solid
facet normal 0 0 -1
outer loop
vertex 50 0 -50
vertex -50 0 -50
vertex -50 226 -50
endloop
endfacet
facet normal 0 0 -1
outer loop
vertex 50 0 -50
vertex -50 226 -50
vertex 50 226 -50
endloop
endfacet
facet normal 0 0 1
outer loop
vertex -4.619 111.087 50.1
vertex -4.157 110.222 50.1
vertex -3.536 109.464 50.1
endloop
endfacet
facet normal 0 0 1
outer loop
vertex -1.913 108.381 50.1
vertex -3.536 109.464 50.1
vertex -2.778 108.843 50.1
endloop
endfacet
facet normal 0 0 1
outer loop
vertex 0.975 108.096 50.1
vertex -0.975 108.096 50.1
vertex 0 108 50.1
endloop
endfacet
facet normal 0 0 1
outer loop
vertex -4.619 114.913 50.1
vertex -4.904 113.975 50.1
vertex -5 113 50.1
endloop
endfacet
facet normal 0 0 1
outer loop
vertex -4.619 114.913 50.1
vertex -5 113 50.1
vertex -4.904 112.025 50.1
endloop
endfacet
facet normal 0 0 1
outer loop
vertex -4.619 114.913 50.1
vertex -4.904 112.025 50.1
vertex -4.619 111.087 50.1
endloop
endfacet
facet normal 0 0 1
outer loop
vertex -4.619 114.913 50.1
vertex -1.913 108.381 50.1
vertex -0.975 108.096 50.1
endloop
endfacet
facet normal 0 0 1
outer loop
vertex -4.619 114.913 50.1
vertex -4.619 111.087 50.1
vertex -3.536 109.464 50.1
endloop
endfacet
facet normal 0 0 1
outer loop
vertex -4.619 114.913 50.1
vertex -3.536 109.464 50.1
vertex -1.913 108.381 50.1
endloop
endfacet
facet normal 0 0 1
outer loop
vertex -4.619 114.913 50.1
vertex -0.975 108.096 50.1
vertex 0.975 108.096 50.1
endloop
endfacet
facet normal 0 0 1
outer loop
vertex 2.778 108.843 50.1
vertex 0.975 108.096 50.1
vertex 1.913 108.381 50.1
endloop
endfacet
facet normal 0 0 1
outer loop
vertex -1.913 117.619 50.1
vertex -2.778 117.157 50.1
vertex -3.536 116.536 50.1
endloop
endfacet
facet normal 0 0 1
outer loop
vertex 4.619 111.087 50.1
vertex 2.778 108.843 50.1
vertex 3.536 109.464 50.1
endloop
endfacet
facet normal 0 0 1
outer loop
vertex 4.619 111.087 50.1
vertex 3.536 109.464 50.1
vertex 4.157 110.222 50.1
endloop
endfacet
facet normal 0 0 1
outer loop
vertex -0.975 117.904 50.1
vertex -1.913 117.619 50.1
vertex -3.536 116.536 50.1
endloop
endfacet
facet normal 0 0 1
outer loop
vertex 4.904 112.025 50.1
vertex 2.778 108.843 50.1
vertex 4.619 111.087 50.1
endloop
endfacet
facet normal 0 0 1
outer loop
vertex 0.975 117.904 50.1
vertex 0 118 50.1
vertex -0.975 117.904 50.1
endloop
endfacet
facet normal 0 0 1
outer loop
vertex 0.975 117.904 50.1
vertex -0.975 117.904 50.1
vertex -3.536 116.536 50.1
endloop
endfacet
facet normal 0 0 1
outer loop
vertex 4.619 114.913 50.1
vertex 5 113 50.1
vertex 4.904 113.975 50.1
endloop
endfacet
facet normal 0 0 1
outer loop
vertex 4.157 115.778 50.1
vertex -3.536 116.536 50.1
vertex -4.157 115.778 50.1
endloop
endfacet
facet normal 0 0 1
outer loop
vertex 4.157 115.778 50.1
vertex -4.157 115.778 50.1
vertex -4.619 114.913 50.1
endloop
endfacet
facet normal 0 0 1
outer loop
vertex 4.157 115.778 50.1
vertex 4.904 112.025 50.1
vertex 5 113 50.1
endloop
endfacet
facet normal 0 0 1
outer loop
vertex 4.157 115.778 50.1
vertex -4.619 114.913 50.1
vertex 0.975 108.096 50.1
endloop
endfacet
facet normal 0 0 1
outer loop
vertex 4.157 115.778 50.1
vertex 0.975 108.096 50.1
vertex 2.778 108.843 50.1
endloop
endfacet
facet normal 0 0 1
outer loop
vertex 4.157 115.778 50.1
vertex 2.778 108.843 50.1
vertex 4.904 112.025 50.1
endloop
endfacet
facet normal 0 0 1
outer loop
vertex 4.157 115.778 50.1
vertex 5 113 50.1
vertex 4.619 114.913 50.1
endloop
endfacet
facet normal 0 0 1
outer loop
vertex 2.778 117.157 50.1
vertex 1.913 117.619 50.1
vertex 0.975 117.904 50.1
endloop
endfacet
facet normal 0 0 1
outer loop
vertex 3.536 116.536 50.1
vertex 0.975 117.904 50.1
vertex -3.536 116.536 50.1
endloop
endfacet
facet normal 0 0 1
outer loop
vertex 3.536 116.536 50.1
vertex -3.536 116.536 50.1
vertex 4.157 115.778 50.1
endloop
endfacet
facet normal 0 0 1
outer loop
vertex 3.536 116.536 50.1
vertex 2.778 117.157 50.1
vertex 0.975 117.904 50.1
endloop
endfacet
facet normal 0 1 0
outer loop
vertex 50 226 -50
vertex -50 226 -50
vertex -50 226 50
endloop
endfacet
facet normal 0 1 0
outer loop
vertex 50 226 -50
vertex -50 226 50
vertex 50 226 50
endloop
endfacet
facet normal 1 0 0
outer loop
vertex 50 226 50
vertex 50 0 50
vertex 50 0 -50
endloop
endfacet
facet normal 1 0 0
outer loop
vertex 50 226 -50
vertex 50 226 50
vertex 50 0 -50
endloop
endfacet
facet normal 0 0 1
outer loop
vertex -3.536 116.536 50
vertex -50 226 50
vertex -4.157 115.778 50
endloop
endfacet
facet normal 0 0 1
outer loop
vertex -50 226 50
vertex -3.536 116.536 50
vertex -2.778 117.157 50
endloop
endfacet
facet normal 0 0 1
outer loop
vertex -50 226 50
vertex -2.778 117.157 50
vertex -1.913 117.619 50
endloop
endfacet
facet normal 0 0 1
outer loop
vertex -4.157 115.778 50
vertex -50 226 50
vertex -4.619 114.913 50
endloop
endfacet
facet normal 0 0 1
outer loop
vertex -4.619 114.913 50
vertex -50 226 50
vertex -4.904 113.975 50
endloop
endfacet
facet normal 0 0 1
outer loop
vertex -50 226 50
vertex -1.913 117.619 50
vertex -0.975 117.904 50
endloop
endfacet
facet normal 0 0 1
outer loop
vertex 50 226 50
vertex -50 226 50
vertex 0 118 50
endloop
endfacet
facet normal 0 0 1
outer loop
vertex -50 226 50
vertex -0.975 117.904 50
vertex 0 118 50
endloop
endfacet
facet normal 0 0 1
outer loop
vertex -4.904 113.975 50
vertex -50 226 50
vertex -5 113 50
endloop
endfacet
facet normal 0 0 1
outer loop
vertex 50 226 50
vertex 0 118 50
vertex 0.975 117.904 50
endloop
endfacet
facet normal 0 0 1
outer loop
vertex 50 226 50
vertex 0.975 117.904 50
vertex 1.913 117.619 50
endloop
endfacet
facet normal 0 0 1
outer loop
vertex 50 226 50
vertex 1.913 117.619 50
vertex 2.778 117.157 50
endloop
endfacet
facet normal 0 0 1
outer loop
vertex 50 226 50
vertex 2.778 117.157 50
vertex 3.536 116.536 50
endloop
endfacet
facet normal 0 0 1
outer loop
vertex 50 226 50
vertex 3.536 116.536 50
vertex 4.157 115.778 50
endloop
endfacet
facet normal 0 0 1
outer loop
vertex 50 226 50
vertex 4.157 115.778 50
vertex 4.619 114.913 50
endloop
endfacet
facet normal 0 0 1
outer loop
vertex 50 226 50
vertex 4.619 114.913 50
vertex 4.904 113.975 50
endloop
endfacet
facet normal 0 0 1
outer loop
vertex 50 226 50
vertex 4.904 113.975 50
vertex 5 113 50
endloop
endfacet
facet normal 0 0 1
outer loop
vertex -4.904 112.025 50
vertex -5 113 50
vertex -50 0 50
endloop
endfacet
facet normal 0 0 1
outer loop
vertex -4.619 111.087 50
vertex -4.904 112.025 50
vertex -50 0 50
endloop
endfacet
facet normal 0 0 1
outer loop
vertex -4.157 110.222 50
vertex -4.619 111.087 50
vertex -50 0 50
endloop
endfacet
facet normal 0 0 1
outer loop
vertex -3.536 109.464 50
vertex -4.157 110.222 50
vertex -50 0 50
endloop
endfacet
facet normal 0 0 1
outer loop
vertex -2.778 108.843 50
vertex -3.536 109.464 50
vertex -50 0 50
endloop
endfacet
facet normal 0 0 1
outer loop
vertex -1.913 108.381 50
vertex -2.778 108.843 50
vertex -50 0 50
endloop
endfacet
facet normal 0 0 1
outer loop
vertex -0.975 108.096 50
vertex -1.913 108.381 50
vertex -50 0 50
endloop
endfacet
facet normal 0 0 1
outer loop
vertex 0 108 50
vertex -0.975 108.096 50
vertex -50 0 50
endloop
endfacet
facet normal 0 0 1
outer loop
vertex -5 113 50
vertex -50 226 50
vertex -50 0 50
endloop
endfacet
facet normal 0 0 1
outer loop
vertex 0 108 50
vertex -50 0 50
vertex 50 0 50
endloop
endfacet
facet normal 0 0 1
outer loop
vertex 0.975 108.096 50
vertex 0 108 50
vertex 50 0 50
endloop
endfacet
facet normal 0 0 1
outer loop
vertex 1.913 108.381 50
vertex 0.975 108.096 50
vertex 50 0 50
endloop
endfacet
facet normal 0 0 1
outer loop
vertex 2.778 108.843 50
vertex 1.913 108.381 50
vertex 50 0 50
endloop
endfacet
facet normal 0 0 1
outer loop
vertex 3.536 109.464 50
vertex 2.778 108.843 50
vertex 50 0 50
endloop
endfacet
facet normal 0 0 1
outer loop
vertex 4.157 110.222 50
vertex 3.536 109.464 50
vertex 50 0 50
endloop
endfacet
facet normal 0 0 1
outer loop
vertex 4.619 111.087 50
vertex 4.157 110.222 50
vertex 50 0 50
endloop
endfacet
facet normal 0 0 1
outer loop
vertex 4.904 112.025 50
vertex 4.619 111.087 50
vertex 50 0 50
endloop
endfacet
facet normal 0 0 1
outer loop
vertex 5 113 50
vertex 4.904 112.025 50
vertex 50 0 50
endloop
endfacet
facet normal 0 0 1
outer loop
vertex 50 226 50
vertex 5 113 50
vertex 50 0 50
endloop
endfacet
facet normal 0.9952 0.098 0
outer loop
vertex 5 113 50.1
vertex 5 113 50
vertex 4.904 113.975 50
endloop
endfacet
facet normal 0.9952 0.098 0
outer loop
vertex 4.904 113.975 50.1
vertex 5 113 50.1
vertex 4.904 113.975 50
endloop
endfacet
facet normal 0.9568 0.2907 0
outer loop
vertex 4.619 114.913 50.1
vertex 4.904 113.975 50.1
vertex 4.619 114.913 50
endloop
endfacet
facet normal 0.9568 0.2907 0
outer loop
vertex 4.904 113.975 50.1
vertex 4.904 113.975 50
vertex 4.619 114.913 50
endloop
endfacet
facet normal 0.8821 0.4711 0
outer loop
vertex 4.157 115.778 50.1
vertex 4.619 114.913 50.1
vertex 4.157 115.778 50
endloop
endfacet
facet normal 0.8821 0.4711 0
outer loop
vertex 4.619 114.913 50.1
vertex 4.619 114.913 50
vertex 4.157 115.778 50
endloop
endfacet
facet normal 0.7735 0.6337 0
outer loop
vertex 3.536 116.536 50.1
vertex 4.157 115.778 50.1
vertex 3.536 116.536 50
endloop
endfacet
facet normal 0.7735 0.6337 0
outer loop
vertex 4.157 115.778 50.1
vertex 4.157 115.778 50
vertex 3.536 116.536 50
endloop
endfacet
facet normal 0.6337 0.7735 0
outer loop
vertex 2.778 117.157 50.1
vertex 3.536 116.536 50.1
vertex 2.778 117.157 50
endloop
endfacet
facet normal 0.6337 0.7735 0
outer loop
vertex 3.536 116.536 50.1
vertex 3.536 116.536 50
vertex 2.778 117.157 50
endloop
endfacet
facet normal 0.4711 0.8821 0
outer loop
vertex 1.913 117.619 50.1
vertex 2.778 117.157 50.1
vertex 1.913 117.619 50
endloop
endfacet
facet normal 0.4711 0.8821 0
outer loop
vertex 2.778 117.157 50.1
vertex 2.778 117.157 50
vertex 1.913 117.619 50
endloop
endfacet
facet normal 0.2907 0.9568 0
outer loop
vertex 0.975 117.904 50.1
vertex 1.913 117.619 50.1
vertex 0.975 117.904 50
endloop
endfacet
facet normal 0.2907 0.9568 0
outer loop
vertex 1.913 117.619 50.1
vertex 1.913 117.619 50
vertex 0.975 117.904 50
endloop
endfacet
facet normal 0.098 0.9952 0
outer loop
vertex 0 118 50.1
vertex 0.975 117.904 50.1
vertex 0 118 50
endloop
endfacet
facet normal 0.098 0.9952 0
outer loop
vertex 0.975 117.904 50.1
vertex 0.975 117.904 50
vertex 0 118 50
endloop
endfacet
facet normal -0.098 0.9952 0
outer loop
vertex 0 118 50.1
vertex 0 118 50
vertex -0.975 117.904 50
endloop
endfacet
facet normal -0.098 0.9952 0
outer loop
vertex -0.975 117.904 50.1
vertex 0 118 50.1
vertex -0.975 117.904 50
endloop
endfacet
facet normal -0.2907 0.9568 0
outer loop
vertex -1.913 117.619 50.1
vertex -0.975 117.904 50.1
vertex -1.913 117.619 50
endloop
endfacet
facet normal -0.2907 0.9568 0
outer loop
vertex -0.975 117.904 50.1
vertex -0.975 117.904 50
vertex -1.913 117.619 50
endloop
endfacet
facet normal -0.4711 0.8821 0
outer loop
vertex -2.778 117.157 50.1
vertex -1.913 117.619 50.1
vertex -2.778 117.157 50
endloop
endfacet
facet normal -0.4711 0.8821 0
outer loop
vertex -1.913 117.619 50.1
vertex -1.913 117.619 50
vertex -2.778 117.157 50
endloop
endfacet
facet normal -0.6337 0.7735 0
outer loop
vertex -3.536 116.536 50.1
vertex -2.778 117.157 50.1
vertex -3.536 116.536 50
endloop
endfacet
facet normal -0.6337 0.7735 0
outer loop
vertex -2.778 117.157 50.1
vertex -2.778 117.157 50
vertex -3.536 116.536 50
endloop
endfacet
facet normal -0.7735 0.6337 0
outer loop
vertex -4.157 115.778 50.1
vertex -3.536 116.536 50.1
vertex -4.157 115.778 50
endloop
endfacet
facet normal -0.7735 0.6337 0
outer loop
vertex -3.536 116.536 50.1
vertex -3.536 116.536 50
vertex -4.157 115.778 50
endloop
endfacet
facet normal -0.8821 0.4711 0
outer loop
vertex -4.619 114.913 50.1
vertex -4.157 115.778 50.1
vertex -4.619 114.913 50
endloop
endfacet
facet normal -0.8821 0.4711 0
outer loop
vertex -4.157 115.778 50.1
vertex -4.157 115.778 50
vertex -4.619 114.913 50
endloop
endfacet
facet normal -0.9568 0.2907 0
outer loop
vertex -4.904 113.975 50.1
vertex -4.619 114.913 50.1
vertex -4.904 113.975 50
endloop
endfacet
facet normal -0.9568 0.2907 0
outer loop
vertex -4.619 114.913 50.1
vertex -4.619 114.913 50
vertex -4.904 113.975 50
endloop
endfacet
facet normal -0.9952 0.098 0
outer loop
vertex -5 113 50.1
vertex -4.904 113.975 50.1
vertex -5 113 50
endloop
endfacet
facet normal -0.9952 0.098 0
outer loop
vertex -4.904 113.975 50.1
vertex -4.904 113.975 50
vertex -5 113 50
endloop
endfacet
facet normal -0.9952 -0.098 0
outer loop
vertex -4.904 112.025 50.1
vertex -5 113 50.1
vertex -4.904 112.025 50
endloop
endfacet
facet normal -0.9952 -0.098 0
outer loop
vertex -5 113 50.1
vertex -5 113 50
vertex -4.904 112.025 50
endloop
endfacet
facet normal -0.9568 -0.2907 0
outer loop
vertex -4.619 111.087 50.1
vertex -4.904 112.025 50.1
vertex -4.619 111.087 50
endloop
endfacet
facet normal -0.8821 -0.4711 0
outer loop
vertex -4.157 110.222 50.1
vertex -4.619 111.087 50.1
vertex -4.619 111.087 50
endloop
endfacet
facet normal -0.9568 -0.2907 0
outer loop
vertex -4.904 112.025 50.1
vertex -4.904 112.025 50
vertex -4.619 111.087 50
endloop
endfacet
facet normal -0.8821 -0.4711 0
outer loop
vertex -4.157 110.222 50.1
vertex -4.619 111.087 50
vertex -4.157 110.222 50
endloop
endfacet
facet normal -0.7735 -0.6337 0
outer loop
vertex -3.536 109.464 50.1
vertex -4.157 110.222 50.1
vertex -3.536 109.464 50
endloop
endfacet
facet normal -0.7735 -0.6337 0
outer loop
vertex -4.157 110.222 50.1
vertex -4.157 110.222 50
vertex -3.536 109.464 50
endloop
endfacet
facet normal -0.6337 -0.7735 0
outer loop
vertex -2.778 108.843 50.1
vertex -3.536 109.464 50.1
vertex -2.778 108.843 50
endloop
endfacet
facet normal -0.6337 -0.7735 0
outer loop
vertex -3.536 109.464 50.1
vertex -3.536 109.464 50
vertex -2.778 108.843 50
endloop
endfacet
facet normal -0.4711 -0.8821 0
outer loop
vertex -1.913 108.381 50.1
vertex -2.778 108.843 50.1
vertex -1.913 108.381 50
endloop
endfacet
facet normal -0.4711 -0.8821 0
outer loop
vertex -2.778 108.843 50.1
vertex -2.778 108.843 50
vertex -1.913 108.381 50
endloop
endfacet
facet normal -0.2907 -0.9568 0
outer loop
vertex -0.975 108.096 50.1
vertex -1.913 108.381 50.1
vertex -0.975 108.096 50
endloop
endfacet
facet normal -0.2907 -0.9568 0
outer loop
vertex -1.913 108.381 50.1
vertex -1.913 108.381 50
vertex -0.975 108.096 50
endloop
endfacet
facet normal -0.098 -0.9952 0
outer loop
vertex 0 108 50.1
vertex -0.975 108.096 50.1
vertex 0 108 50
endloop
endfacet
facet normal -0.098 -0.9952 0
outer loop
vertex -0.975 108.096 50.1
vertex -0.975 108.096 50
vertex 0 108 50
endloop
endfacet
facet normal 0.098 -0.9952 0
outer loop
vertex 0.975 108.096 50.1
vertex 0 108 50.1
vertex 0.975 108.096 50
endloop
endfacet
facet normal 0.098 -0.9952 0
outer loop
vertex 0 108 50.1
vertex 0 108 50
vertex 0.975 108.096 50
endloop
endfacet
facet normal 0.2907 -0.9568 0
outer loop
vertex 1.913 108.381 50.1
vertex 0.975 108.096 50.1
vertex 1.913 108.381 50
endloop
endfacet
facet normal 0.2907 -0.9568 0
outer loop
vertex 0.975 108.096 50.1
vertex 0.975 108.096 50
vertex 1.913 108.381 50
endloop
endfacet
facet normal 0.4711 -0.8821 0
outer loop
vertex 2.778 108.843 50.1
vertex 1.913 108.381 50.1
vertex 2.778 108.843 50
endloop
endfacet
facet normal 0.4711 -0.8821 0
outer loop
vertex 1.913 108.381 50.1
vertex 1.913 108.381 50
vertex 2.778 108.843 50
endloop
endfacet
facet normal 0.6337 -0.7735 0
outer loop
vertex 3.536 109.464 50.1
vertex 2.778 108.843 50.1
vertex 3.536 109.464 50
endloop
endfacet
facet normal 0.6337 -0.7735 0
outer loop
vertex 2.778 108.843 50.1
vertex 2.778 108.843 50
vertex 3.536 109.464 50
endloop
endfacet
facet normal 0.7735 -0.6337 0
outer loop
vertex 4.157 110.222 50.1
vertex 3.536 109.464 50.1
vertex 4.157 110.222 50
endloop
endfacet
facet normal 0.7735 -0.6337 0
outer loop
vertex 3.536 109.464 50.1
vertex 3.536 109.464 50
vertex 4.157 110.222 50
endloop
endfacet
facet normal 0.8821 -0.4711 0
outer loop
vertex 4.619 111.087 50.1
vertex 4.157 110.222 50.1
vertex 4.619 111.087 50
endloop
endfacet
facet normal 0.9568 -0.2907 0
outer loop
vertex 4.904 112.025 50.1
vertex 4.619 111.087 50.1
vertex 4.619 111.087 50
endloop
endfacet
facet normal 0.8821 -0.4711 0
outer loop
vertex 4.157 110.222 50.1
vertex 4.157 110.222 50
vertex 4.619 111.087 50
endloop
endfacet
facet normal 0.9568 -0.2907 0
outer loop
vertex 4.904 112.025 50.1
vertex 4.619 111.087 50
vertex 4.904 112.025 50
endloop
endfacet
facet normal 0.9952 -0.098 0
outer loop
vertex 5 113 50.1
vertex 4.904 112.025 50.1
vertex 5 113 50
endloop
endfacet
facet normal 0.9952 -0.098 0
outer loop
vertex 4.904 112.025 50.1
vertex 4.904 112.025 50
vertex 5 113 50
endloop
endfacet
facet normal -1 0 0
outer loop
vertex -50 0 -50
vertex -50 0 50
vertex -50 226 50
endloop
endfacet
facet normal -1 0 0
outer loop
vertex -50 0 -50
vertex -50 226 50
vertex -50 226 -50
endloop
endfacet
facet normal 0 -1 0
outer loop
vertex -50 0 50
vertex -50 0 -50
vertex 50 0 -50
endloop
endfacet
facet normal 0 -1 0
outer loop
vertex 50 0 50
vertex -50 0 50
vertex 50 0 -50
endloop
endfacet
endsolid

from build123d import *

# Parameters (mm, degrees)
SKETCH1_W           = 100
SKETCH1_H           = 100
BOSS_EXTRUDE1_DEPTH = 226
SKETCH2_R           = 5
BOSS_EXTRUDE2_DEPTH = 0.1


with BuildPart() as part:
    # Sketch1 → Boss-Extrude1 (new body)
    with BuildSketch(Plane(origin=(0, 0, 0), x_dir=(1, 0, 0), z_dir=(0, 1, 0))):
        Rectangle(SKETCH1_W, SKETCH1_H)
    extrude(amount=BOSS_EXTRUDE1_DEPTH)

    # Sketch2 → Boss-Extrude2 (add)
    with BuildSketch(Plane.XY.offset(50)):
        with Locations((0, 113)):
            Circle(SKETCH2_R)
    extrude(amount=BOSS_EXTRUDE2_DEPTH)


solid = part.part
